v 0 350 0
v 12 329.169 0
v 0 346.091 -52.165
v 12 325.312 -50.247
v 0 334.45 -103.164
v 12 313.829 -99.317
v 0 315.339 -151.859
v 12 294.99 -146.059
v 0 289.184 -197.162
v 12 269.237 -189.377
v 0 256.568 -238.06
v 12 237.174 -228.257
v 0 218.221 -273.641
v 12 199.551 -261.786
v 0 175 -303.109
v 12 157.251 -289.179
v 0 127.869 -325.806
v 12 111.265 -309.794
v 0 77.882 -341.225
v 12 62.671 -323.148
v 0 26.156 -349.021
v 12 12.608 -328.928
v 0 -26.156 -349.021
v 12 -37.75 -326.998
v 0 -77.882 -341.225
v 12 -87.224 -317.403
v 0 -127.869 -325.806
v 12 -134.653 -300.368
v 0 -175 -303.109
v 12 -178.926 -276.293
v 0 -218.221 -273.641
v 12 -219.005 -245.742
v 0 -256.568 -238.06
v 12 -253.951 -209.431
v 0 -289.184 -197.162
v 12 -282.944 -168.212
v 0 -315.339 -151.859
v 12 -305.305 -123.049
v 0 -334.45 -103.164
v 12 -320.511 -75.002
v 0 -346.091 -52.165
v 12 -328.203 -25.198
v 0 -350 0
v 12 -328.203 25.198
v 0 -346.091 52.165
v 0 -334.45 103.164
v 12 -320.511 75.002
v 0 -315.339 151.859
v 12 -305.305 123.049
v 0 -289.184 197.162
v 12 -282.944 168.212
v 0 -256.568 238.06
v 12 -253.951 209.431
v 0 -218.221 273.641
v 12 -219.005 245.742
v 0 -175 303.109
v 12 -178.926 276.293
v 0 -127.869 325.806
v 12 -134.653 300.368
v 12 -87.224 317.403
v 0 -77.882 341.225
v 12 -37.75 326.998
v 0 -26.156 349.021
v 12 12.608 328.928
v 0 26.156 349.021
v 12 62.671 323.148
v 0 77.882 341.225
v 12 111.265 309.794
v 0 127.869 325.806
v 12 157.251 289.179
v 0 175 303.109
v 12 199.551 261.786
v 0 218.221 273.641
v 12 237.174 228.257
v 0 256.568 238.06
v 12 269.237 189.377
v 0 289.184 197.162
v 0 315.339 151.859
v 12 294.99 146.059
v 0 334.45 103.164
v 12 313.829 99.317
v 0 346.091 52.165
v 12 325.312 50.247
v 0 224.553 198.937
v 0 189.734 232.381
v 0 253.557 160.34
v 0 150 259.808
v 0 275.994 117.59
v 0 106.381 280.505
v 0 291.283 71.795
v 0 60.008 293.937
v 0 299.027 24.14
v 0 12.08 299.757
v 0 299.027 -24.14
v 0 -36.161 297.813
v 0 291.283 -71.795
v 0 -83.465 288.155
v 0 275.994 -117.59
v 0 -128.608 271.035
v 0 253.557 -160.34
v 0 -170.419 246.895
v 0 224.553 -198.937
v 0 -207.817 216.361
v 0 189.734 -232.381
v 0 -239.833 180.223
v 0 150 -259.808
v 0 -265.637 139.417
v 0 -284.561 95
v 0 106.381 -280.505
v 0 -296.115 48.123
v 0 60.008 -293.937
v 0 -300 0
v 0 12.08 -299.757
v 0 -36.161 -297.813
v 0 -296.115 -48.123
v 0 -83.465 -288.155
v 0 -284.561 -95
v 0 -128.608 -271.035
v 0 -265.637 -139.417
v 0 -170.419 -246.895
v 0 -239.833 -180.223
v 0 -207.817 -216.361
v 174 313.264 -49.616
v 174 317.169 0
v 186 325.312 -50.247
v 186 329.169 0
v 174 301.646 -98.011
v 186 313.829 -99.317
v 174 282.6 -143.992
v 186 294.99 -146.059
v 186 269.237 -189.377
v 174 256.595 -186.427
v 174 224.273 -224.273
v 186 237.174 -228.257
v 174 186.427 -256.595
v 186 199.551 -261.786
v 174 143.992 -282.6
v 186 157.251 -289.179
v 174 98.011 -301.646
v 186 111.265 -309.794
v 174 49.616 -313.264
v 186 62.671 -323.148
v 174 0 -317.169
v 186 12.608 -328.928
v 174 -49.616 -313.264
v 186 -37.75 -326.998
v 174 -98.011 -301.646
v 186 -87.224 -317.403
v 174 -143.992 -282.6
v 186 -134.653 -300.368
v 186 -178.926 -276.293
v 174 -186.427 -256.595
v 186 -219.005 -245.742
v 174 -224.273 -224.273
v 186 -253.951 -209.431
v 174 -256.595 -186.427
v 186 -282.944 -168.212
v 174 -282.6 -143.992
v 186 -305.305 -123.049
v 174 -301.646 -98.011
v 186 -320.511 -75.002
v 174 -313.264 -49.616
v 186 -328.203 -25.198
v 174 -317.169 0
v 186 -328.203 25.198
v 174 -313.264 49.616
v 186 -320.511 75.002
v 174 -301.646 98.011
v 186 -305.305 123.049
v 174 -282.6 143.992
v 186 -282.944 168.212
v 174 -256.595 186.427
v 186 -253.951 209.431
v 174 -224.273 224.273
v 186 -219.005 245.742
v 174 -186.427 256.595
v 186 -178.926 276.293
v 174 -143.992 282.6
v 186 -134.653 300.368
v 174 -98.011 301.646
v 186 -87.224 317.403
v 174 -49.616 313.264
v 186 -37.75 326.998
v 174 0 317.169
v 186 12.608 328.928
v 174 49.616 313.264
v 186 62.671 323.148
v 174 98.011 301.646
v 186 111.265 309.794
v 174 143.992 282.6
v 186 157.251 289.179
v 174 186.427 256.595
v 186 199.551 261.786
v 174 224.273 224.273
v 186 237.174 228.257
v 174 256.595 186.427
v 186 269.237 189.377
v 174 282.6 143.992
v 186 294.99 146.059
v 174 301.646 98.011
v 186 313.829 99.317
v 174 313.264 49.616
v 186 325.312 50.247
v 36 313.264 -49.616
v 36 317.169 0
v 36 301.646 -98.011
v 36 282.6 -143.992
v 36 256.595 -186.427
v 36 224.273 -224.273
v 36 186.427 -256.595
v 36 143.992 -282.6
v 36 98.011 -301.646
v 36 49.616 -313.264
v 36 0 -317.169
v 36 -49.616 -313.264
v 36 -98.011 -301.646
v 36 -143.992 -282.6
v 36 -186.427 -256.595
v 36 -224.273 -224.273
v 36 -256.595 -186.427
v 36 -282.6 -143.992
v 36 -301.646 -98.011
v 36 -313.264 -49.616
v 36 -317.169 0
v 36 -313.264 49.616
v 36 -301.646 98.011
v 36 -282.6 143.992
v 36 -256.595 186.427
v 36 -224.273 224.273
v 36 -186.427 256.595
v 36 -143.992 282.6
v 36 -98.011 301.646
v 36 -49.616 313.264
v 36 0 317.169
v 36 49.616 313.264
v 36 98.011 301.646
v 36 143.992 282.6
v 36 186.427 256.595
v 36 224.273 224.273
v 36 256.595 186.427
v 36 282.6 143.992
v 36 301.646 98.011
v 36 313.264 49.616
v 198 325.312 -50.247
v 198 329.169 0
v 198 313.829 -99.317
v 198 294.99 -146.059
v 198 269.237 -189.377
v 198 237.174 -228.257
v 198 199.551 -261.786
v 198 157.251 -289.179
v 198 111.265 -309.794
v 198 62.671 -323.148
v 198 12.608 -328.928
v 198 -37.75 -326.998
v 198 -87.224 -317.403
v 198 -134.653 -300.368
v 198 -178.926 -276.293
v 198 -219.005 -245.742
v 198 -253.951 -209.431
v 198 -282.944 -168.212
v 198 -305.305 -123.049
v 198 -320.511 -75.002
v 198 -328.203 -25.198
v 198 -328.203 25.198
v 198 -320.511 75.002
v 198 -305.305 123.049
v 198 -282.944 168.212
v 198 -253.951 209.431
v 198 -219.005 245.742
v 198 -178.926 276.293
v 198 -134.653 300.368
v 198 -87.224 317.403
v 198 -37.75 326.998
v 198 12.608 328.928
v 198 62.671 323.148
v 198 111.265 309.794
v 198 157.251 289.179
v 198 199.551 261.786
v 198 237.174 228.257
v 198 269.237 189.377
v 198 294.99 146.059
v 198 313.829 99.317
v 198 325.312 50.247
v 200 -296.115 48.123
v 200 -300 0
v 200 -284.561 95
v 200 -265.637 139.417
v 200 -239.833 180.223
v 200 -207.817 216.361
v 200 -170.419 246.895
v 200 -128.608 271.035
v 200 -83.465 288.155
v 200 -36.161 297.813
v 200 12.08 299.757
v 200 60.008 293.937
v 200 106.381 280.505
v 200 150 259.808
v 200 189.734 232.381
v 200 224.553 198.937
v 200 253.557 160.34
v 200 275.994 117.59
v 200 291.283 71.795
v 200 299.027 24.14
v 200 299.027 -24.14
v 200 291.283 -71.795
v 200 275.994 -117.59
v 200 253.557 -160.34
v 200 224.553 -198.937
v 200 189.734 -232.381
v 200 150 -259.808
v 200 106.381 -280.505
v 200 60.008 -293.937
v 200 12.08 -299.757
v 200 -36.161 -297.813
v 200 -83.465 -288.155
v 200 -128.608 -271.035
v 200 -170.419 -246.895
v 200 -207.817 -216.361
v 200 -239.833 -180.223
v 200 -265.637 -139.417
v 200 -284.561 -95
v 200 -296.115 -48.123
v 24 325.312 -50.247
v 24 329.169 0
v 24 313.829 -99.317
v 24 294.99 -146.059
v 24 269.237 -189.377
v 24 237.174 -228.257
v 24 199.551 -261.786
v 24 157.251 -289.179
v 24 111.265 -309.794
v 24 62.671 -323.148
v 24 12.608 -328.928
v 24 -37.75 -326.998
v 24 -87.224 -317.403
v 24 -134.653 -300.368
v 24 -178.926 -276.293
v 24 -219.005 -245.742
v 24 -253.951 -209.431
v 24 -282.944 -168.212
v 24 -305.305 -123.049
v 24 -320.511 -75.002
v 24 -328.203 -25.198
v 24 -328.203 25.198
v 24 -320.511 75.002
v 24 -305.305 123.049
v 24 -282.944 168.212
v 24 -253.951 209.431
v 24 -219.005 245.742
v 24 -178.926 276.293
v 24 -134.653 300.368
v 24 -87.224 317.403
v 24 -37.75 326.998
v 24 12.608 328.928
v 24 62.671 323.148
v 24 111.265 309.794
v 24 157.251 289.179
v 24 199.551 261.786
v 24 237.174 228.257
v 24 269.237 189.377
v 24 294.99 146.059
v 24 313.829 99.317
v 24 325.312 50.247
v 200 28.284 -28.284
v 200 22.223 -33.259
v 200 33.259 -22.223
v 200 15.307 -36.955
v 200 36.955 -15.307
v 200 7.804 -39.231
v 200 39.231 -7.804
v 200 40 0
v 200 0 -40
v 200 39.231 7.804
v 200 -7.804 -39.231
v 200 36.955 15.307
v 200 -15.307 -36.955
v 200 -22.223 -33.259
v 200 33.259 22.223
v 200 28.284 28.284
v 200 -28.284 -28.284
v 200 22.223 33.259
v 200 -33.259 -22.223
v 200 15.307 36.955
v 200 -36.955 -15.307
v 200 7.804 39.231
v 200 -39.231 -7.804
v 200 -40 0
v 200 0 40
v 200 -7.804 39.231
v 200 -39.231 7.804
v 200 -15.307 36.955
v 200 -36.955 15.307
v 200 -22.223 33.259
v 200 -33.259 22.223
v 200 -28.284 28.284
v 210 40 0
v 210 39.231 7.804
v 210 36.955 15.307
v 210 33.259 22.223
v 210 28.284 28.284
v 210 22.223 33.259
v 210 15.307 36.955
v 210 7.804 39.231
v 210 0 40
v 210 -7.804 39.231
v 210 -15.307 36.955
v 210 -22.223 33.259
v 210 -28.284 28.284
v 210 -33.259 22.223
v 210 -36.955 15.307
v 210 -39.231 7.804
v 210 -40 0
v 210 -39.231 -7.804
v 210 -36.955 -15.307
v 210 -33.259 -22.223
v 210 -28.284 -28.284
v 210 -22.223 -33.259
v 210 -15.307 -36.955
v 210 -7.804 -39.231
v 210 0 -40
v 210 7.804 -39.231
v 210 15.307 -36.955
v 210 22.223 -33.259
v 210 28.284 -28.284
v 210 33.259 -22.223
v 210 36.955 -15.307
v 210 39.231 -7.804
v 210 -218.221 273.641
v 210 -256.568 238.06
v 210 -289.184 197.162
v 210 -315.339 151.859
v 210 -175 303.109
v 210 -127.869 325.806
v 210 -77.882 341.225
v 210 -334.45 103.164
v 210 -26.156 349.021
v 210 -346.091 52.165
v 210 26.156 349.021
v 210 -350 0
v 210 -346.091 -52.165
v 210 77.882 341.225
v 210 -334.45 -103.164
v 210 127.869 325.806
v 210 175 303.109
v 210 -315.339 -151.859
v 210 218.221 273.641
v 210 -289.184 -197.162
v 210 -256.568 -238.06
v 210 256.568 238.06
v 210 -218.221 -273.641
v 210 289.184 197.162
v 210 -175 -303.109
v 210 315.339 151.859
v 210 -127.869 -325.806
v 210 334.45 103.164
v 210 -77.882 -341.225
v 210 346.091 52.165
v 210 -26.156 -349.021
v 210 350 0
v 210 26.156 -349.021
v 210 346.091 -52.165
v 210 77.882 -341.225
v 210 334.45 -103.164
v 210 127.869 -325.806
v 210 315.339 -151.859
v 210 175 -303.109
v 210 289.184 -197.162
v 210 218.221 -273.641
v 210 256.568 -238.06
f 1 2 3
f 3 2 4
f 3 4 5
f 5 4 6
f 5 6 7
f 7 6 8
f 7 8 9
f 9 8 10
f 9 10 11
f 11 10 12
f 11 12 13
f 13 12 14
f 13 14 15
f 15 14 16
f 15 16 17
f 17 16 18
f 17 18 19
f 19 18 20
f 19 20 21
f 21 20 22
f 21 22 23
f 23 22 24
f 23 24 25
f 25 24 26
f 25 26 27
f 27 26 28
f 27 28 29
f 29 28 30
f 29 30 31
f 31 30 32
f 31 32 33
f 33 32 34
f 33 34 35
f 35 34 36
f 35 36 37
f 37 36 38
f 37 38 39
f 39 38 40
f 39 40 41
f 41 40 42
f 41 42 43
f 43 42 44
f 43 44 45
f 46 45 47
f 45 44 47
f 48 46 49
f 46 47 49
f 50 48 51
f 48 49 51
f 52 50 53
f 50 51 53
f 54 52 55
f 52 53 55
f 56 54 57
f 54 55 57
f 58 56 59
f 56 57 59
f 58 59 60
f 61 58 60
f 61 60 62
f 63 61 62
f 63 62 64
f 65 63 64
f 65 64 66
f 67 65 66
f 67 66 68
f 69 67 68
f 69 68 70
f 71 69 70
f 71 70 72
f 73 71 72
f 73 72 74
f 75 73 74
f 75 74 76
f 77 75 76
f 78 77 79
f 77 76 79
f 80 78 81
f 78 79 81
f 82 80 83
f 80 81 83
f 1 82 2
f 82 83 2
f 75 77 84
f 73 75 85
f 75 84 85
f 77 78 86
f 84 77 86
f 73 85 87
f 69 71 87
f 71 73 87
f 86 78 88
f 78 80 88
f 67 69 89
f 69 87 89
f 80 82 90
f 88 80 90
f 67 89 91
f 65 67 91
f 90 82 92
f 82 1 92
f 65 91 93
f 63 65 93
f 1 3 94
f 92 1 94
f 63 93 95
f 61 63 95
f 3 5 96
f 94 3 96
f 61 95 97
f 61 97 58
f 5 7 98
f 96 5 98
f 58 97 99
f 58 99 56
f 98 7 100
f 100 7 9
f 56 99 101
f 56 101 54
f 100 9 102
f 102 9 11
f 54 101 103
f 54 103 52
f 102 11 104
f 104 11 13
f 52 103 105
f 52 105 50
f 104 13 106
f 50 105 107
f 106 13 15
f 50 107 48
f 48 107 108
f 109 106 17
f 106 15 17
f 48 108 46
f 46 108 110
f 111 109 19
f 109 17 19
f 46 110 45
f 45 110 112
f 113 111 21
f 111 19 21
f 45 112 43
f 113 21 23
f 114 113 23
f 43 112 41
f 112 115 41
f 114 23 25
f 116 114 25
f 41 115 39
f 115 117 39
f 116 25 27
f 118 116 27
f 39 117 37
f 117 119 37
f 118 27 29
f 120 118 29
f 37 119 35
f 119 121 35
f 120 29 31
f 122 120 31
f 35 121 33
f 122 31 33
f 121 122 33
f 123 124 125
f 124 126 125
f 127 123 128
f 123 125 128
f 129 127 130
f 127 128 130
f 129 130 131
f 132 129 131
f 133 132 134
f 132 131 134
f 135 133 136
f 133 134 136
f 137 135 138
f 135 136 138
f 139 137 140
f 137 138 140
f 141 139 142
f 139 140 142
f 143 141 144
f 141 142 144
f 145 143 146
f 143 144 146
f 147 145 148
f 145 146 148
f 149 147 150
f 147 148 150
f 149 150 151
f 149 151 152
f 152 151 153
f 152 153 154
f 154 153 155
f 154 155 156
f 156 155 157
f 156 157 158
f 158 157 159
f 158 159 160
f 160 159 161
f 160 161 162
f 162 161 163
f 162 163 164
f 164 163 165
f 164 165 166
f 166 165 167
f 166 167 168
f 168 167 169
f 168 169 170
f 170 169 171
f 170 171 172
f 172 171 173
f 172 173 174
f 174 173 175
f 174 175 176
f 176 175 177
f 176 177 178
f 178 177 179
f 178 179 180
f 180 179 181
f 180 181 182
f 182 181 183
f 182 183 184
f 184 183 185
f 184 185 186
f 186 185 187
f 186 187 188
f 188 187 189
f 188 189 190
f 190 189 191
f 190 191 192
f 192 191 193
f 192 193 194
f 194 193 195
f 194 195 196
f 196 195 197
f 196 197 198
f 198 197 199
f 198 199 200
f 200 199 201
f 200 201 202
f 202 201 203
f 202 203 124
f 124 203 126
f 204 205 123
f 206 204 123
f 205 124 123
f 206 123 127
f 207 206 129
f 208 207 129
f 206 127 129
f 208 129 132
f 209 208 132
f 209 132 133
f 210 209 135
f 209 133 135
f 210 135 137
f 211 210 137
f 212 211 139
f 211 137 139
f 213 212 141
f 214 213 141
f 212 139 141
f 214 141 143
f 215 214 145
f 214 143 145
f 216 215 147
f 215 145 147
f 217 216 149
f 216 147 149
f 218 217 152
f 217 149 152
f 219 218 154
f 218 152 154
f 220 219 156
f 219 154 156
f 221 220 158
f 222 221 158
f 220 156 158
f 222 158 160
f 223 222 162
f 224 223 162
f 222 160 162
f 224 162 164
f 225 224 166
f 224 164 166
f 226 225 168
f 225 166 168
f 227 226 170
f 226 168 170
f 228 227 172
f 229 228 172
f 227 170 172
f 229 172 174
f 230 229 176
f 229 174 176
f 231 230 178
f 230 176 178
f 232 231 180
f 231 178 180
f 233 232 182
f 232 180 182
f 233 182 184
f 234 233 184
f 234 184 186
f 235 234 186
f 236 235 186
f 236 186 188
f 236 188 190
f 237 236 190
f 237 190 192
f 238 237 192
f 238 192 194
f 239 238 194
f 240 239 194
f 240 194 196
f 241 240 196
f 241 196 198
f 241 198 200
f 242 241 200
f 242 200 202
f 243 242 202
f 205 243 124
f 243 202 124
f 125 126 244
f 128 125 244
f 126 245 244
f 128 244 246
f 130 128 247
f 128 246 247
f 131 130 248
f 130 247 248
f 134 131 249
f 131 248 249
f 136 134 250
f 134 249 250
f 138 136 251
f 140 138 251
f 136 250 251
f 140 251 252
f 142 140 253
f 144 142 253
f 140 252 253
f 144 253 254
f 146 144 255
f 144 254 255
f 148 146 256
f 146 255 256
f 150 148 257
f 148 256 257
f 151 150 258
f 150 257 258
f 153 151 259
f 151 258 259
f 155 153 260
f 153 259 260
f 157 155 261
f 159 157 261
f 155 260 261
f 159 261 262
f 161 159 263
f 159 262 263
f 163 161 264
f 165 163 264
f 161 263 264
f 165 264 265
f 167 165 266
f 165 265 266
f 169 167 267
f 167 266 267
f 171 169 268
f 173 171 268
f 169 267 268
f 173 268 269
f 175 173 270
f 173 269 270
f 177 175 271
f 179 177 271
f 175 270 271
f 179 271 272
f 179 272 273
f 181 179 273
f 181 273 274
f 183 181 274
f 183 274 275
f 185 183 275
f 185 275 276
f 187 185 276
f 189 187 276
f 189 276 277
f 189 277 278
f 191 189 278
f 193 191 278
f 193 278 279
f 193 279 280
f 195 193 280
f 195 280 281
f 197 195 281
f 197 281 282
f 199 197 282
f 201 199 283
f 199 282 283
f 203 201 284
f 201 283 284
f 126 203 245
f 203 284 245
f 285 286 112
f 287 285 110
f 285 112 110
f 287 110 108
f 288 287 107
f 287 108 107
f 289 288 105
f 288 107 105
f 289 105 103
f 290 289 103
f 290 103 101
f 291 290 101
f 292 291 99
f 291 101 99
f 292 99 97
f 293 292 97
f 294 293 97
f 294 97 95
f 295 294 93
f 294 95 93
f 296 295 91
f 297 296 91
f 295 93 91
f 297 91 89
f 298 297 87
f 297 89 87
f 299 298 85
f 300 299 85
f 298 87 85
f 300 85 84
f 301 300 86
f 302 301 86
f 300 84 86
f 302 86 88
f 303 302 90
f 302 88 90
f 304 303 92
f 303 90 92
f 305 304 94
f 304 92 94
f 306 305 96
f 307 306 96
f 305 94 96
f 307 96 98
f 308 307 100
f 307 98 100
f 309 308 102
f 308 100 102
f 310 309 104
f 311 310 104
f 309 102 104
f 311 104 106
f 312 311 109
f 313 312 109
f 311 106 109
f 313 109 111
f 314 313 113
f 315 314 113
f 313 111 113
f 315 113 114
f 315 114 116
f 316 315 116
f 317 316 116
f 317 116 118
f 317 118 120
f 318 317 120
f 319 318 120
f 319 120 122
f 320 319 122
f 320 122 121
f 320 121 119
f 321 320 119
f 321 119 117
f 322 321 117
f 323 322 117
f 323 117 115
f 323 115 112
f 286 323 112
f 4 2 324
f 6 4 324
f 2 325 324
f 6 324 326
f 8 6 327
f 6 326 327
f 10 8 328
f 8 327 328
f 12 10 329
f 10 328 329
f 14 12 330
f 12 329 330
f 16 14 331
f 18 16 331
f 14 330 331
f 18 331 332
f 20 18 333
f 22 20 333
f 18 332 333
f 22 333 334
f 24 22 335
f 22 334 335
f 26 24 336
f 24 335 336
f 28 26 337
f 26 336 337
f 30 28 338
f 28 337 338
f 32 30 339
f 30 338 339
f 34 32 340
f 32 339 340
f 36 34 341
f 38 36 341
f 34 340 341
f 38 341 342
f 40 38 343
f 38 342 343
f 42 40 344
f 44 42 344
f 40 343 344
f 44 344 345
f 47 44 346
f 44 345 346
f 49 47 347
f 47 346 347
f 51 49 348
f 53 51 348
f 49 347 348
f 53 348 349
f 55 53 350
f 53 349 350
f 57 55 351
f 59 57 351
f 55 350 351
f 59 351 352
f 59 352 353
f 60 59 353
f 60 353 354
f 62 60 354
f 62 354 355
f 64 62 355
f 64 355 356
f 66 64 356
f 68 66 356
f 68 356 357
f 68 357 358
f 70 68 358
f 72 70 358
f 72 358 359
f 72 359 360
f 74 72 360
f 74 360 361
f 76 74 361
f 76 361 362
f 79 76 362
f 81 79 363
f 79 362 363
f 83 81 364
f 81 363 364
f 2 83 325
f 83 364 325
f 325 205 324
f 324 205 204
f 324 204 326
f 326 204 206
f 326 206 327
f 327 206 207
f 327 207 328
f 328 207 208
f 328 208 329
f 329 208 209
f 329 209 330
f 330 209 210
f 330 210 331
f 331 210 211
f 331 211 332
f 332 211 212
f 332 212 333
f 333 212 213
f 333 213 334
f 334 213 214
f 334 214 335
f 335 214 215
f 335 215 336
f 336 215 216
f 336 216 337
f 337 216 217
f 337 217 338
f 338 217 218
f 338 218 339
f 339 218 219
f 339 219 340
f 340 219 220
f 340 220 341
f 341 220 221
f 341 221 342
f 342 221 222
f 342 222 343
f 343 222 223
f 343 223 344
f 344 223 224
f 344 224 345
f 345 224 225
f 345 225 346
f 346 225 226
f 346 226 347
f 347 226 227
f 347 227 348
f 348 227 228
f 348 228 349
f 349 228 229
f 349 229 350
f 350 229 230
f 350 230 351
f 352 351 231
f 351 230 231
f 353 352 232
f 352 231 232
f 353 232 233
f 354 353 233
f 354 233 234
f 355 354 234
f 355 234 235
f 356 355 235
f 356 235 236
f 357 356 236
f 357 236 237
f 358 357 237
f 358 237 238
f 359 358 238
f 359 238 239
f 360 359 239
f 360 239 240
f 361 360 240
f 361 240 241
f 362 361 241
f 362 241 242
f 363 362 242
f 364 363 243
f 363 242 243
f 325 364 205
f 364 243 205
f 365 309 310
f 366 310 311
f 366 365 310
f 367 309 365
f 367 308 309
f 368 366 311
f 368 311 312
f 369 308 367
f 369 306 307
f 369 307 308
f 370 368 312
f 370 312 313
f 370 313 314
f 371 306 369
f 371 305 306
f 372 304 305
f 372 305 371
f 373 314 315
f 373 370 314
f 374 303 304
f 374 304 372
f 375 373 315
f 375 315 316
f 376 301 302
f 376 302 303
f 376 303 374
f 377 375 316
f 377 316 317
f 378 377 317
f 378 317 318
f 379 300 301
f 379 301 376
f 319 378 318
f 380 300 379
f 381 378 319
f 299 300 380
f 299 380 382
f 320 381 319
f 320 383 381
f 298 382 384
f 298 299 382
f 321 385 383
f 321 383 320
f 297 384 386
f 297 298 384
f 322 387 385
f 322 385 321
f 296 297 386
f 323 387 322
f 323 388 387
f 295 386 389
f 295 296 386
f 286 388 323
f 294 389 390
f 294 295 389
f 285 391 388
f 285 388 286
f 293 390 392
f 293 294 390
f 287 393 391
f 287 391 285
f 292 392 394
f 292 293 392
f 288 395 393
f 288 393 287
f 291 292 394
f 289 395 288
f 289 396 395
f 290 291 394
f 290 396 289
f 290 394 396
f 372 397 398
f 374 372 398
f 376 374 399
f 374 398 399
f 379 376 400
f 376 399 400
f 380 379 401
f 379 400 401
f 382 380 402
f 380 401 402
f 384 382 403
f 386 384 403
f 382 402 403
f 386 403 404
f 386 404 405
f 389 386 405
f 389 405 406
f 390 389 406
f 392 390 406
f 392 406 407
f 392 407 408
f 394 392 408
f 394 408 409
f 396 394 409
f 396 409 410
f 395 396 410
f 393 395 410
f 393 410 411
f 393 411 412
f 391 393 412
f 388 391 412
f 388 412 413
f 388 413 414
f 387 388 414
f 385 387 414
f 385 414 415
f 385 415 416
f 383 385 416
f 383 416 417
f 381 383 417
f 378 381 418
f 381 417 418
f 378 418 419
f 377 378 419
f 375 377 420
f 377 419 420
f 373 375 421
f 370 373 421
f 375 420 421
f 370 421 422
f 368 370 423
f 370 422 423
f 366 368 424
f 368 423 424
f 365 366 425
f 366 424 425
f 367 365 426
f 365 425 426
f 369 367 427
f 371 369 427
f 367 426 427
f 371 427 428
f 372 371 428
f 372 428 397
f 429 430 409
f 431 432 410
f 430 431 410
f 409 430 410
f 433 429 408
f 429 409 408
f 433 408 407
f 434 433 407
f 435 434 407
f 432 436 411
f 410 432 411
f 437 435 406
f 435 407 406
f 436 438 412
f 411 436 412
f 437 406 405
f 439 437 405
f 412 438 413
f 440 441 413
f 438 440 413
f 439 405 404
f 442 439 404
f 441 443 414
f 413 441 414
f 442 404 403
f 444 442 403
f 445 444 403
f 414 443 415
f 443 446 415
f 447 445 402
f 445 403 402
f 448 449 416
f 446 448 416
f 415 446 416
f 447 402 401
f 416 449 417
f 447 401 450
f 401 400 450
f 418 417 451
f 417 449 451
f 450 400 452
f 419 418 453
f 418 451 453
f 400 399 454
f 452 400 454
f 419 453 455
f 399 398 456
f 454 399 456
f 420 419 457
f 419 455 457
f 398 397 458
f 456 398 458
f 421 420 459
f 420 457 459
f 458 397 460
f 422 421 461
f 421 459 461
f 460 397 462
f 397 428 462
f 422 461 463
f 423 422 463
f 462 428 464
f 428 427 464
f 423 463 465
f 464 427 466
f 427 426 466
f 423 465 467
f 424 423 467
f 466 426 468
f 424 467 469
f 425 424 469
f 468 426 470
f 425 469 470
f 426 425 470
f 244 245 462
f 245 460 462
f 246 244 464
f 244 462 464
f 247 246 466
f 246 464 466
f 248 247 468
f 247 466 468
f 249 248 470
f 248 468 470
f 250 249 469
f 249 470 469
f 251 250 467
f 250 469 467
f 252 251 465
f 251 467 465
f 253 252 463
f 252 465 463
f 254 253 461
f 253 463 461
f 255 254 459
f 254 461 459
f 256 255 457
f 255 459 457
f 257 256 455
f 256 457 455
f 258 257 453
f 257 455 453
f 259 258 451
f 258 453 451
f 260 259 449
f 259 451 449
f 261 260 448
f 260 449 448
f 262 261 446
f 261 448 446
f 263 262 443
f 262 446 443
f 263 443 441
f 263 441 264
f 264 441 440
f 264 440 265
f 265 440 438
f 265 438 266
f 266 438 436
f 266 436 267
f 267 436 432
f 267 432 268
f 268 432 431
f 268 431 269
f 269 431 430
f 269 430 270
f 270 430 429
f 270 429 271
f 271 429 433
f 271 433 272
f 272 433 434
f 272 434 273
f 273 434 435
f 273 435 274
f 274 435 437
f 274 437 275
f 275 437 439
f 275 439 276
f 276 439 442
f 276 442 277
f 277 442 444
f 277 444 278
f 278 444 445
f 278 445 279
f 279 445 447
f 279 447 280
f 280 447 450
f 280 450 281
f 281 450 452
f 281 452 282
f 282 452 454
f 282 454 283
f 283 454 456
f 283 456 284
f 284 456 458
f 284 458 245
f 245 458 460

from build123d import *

# Parameters (mm, degrees)
SKETCH2_R          = 300
CUT_EXTRUDE1_DEPTH = 200
SKETCH3_R          = 40
CUT_EXTRUDE2_DEPTH = 200


with BuildPart() as part:
    # Sketch1 → Revolve2 (revolve)
    with BuildSketch(Plane.XY):
        Polygon((0, 0), (0, 350), (12, 329.169330118), (24, 329.169330118), (36, 317.169330118), (174, 317.169330118), (186, 329.169330118), (198, 329.169330118), (210, 350), (210, 0), align=None)
    revolve(axis=Axis((210, 0, 0), (-1, 0, 0)))

    # Sketch2 → Cut-Extrude1 (cut)
    with BuildSketch(Plane.ZY):
        with Locations(Location((0, 0, 0), (0, 0, 270))):
            Circle(SKETCH2_R)
    extrude(amount=-CUT_EXTRUDE1_DEPTH, mode=Mode.SUBTRACT)

    # Sketch3 → Cut-Extrude2 (cut)
    with BuildSketch(Plane(origin=(210, 0, 0), x_dir=(0, 0, -1), z_dir=(1, 0, 0))):
        with Locations(Location((0, 0, 0), (0, 0, 90))):
            Circle(SKETCH3_R)
    extrude(amount=-CUT_EXTRUDE2_DEPTH, mode=Mode.SUBTRACT)


solid = part.part
